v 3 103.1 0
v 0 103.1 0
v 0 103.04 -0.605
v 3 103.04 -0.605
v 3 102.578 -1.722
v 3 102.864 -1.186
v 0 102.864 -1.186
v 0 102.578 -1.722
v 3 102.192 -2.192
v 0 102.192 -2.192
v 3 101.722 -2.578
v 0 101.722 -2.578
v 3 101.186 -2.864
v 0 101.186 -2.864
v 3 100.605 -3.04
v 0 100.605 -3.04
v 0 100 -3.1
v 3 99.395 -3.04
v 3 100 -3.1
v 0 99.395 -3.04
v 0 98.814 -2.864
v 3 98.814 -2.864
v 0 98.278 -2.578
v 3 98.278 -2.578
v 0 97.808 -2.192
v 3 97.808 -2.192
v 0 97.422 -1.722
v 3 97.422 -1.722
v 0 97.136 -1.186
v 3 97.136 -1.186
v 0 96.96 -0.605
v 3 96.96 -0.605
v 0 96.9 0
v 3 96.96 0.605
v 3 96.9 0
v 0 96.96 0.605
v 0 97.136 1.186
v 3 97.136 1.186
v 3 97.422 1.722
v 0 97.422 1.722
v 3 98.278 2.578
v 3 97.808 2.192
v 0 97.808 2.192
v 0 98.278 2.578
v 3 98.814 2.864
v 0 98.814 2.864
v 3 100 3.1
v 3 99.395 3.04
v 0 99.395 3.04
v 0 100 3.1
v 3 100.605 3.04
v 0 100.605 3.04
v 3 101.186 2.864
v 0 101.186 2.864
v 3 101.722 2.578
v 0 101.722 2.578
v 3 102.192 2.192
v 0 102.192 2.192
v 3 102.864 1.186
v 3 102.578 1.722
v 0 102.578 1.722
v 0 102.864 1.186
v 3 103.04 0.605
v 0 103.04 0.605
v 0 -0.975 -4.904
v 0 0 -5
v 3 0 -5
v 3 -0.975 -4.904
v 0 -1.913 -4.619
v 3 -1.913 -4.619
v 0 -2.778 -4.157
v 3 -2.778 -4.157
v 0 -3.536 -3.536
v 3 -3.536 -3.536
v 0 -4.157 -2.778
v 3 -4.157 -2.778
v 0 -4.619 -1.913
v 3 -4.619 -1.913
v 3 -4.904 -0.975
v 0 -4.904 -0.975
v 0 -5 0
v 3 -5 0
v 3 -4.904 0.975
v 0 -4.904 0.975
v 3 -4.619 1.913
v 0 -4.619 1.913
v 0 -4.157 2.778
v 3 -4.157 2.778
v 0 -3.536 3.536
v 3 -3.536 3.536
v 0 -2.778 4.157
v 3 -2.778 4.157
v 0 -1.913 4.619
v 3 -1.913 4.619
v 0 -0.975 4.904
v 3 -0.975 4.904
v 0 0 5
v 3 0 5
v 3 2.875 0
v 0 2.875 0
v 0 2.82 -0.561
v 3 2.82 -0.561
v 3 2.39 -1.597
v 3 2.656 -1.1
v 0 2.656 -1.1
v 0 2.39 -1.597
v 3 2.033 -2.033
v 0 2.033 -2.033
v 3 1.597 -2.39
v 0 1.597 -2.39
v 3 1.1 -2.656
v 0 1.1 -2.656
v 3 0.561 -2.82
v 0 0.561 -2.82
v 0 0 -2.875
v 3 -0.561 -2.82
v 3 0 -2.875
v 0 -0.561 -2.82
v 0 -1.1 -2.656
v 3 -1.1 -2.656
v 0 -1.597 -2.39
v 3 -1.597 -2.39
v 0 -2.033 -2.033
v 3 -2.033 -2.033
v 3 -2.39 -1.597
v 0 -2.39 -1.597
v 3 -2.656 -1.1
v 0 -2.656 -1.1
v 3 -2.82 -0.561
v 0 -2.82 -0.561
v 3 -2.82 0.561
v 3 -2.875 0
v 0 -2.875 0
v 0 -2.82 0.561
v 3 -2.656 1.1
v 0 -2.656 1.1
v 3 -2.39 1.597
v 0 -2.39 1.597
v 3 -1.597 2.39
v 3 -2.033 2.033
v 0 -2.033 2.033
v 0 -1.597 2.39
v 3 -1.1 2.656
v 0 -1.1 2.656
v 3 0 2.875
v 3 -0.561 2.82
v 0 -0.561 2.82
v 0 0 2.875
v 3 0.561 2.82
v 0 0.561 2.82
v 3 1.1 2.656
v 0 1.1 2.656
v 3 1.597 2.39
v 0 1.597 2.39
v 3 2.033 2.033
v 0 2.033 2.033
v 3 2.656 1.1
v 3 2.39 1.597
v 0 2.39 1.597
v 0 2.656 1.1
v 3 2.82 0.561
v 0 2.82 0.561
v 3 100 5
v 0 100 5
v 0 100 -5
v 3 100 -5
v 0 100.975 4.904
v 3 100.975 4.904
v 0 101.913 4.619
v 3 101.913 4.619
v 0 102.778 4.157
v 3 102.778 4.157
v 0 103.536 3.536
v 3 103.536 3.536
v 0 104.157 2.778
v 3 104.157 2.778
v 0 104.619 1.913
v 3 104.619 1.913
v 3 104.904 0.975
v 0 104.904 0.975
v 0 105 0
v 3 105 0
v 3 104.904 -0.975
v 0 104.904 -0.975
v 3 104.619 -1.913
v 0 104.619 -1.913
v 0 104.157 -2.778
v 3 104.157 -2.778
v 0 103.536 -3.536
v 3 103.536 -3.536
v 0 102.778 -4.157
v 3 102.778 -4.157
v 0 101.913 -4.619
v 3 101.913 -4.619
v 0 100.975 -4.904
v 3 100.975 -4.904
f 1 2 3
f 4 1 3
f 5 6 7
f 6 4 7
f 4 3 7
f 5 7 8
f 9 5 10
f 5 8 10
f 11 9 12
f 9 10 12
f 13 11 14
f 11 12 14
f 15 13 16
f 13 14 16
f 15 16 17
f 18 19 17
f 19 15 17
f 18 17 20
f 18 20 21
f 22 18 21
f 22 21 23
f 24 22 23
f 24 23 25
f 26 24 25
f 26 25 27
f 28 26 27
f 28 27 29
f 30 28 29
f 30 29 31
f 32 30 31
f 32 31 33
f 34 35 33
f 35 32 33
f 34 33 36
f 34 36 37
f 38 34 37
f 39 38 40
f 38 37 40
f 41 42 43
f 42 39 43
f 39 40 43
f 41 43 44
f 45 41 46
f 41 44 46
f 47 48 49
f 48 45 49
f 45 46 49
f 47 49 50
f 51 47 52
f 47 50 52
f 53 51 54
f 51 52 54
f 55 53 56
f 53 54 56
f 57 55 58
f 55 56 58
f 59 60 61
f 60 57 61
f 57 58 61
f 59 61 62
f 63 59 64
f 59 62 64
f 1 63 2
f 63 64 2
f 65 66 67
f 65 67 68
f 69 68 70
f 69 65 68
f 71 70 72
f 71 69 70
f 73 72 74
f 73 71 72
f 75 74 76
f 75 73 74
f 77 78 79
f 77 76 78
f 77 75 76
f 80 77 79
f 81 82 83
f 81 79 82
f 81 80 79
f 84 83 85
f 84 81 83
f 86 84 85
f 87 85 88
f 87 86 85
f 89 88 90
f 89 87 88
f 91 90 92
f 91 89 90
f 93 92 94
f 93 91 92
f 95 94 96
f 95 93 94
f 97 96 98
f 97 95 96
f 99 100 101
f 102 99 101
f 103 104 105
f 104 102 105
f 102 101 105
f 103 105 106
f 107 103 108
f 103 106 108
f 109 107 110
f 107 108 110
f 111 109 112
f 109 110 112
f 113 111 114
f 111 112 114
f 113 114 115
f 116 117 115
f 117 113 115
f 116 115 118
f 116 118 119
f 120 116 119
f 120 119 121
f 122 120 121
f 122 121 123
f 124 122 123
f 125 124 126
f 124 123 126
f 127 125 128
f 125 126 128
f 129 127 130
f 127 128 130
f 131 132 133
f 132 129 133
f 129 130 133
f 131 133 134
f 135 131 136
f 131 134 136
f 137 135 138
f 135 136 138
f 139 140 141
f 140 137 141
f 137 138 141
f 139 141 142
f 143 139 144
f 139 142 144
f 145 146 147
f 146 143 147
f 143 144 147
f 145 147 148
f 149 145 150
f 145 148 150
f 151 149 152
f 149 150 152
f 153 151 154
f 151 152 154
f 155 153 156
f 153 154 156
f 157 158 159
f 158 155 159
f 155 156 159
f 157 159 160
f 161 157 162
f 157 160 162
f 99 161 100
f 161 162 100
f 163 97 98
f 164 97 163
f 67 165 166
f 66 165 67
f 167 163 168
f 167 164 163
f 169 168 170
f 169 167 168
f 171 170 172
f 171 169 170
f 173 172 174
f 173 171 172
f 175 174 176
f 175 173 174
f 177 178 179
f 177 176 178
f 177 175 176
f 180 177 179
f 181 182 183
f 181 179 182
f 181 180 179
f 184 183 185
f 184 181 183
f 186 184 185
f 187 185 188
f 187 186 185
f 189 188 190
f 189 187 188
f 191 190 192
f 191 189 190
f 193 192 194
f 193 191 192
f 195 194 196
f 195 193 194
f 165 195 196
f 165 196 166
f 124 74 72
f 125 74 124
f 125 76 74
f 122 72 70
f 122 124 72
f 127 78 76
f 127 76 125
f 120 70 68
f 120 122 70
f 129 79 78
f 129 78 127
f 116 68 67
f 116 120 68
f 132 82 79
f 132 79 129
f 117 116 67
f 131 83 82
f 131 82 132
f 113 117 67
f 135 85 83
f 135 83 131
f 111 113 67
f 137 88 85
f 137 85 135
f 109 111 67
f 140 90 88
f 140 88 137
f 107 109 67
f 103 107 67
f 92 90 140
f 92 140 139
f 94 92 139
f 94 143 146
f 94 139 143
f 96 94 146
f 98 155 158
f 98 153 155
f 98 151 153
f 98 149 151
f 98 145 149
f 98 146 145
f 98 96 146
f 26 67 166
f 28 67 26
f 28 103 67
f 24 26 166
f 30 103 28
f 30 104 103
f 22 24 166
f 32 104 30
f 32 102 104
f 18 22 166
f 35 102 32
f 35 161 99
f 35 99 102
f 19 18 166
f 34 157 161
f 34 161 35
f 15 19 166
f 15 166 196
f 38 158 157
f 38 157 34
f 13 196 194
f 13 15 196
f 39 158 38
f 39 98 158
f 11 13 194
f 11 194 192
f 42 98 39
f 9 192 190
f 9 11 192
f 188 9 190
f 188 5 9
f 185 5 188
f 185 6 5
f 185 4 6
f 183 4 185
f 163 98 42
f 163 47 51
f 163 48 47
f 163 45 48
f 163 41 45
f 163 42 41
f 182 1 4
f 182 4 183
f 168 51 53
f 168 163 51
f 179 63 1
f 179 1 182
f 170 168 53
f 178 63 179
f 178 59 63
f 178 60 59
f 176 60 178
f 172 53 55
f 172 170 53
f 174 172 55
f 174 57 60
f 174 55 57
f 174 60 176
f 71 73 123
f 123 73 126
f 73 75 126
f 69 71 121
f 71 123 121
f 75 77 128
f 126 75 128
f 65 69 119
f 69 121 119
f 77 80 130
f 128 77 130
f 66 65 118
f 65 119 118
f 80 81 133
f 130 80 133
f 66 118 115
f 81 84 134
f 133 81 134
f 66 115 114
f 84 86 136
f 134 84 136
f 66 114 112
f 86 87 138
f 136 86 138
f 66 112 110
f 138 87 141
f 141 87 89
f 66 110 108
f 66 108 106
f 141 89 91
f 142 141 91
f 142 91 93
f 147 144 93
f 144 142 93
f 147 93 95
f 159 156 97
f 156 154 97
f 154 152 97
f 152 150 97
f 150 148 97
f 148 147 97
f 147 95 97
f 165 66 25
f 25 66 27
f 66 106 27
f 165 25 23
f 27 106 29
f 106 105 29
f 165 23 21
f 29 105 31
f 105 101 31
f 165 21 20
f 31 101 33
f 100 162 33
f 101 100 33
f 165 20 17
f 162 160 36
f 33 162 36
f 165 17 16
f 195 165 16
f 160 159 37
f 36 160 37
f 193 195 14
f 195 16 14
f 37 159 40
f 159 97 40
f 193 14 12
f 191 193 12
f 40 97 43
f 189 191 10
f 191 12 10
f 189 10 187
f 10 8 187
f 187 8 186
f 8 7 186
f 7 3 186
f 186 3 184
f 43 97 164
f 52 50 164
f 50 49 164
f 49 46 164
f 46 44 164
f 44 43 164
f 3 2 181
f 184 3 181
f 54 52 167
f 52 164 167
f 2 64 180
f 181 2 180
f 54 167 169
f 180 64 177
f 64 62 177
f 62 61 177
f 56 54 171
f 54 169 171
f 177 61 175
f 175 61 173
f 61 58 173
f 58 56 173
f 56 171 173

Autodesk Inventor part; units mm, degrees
ref_plane "YZ Plane" through (0, 0, 0) normal (1, 0, 0) x (0, 1, 0)
ref_plane "XZ Plane" through (0, 0, 0) normal (0, 1, 0) x (-1, 0, 0)
ref_plane "XY Plane" through (0, 0, 0) normal (0, 0, 1) x (1, 0, 0)
sketch "Sketch1" plane through (0, 0, 0) normal (1, 0, 0) x (0, 1, 0)
  circle A0 centre (0, 0) radius 2.875
  arc A1 (0, 5) -> (0, -5) centre (0, 0) ccw
  line L0 (0, 5) -> (100, 5)
  line L1 (100, -5) -> (0, -5)
  arc A2 (100, -5) -> (100, 5) centre (100, 0) ccw
  circle A3 centre (100, 0) radius 3.1
  dimension "d0" = 5.75
  dimension "d1" = 10
  dimension "d3" = 100
  dimension "d5" = 6.2
  dimension "d27" = 5
extrude "Extrusion1" add sketch "Sketch1" along normal blind 3
ref_plane "Work Plane1" through (-2, 0, 0) normal (1, 0, 0) x (0, 0, -1)
equation "\"d27\" = 0.5 * d1"
properties part number "ServoLinkage_015"
